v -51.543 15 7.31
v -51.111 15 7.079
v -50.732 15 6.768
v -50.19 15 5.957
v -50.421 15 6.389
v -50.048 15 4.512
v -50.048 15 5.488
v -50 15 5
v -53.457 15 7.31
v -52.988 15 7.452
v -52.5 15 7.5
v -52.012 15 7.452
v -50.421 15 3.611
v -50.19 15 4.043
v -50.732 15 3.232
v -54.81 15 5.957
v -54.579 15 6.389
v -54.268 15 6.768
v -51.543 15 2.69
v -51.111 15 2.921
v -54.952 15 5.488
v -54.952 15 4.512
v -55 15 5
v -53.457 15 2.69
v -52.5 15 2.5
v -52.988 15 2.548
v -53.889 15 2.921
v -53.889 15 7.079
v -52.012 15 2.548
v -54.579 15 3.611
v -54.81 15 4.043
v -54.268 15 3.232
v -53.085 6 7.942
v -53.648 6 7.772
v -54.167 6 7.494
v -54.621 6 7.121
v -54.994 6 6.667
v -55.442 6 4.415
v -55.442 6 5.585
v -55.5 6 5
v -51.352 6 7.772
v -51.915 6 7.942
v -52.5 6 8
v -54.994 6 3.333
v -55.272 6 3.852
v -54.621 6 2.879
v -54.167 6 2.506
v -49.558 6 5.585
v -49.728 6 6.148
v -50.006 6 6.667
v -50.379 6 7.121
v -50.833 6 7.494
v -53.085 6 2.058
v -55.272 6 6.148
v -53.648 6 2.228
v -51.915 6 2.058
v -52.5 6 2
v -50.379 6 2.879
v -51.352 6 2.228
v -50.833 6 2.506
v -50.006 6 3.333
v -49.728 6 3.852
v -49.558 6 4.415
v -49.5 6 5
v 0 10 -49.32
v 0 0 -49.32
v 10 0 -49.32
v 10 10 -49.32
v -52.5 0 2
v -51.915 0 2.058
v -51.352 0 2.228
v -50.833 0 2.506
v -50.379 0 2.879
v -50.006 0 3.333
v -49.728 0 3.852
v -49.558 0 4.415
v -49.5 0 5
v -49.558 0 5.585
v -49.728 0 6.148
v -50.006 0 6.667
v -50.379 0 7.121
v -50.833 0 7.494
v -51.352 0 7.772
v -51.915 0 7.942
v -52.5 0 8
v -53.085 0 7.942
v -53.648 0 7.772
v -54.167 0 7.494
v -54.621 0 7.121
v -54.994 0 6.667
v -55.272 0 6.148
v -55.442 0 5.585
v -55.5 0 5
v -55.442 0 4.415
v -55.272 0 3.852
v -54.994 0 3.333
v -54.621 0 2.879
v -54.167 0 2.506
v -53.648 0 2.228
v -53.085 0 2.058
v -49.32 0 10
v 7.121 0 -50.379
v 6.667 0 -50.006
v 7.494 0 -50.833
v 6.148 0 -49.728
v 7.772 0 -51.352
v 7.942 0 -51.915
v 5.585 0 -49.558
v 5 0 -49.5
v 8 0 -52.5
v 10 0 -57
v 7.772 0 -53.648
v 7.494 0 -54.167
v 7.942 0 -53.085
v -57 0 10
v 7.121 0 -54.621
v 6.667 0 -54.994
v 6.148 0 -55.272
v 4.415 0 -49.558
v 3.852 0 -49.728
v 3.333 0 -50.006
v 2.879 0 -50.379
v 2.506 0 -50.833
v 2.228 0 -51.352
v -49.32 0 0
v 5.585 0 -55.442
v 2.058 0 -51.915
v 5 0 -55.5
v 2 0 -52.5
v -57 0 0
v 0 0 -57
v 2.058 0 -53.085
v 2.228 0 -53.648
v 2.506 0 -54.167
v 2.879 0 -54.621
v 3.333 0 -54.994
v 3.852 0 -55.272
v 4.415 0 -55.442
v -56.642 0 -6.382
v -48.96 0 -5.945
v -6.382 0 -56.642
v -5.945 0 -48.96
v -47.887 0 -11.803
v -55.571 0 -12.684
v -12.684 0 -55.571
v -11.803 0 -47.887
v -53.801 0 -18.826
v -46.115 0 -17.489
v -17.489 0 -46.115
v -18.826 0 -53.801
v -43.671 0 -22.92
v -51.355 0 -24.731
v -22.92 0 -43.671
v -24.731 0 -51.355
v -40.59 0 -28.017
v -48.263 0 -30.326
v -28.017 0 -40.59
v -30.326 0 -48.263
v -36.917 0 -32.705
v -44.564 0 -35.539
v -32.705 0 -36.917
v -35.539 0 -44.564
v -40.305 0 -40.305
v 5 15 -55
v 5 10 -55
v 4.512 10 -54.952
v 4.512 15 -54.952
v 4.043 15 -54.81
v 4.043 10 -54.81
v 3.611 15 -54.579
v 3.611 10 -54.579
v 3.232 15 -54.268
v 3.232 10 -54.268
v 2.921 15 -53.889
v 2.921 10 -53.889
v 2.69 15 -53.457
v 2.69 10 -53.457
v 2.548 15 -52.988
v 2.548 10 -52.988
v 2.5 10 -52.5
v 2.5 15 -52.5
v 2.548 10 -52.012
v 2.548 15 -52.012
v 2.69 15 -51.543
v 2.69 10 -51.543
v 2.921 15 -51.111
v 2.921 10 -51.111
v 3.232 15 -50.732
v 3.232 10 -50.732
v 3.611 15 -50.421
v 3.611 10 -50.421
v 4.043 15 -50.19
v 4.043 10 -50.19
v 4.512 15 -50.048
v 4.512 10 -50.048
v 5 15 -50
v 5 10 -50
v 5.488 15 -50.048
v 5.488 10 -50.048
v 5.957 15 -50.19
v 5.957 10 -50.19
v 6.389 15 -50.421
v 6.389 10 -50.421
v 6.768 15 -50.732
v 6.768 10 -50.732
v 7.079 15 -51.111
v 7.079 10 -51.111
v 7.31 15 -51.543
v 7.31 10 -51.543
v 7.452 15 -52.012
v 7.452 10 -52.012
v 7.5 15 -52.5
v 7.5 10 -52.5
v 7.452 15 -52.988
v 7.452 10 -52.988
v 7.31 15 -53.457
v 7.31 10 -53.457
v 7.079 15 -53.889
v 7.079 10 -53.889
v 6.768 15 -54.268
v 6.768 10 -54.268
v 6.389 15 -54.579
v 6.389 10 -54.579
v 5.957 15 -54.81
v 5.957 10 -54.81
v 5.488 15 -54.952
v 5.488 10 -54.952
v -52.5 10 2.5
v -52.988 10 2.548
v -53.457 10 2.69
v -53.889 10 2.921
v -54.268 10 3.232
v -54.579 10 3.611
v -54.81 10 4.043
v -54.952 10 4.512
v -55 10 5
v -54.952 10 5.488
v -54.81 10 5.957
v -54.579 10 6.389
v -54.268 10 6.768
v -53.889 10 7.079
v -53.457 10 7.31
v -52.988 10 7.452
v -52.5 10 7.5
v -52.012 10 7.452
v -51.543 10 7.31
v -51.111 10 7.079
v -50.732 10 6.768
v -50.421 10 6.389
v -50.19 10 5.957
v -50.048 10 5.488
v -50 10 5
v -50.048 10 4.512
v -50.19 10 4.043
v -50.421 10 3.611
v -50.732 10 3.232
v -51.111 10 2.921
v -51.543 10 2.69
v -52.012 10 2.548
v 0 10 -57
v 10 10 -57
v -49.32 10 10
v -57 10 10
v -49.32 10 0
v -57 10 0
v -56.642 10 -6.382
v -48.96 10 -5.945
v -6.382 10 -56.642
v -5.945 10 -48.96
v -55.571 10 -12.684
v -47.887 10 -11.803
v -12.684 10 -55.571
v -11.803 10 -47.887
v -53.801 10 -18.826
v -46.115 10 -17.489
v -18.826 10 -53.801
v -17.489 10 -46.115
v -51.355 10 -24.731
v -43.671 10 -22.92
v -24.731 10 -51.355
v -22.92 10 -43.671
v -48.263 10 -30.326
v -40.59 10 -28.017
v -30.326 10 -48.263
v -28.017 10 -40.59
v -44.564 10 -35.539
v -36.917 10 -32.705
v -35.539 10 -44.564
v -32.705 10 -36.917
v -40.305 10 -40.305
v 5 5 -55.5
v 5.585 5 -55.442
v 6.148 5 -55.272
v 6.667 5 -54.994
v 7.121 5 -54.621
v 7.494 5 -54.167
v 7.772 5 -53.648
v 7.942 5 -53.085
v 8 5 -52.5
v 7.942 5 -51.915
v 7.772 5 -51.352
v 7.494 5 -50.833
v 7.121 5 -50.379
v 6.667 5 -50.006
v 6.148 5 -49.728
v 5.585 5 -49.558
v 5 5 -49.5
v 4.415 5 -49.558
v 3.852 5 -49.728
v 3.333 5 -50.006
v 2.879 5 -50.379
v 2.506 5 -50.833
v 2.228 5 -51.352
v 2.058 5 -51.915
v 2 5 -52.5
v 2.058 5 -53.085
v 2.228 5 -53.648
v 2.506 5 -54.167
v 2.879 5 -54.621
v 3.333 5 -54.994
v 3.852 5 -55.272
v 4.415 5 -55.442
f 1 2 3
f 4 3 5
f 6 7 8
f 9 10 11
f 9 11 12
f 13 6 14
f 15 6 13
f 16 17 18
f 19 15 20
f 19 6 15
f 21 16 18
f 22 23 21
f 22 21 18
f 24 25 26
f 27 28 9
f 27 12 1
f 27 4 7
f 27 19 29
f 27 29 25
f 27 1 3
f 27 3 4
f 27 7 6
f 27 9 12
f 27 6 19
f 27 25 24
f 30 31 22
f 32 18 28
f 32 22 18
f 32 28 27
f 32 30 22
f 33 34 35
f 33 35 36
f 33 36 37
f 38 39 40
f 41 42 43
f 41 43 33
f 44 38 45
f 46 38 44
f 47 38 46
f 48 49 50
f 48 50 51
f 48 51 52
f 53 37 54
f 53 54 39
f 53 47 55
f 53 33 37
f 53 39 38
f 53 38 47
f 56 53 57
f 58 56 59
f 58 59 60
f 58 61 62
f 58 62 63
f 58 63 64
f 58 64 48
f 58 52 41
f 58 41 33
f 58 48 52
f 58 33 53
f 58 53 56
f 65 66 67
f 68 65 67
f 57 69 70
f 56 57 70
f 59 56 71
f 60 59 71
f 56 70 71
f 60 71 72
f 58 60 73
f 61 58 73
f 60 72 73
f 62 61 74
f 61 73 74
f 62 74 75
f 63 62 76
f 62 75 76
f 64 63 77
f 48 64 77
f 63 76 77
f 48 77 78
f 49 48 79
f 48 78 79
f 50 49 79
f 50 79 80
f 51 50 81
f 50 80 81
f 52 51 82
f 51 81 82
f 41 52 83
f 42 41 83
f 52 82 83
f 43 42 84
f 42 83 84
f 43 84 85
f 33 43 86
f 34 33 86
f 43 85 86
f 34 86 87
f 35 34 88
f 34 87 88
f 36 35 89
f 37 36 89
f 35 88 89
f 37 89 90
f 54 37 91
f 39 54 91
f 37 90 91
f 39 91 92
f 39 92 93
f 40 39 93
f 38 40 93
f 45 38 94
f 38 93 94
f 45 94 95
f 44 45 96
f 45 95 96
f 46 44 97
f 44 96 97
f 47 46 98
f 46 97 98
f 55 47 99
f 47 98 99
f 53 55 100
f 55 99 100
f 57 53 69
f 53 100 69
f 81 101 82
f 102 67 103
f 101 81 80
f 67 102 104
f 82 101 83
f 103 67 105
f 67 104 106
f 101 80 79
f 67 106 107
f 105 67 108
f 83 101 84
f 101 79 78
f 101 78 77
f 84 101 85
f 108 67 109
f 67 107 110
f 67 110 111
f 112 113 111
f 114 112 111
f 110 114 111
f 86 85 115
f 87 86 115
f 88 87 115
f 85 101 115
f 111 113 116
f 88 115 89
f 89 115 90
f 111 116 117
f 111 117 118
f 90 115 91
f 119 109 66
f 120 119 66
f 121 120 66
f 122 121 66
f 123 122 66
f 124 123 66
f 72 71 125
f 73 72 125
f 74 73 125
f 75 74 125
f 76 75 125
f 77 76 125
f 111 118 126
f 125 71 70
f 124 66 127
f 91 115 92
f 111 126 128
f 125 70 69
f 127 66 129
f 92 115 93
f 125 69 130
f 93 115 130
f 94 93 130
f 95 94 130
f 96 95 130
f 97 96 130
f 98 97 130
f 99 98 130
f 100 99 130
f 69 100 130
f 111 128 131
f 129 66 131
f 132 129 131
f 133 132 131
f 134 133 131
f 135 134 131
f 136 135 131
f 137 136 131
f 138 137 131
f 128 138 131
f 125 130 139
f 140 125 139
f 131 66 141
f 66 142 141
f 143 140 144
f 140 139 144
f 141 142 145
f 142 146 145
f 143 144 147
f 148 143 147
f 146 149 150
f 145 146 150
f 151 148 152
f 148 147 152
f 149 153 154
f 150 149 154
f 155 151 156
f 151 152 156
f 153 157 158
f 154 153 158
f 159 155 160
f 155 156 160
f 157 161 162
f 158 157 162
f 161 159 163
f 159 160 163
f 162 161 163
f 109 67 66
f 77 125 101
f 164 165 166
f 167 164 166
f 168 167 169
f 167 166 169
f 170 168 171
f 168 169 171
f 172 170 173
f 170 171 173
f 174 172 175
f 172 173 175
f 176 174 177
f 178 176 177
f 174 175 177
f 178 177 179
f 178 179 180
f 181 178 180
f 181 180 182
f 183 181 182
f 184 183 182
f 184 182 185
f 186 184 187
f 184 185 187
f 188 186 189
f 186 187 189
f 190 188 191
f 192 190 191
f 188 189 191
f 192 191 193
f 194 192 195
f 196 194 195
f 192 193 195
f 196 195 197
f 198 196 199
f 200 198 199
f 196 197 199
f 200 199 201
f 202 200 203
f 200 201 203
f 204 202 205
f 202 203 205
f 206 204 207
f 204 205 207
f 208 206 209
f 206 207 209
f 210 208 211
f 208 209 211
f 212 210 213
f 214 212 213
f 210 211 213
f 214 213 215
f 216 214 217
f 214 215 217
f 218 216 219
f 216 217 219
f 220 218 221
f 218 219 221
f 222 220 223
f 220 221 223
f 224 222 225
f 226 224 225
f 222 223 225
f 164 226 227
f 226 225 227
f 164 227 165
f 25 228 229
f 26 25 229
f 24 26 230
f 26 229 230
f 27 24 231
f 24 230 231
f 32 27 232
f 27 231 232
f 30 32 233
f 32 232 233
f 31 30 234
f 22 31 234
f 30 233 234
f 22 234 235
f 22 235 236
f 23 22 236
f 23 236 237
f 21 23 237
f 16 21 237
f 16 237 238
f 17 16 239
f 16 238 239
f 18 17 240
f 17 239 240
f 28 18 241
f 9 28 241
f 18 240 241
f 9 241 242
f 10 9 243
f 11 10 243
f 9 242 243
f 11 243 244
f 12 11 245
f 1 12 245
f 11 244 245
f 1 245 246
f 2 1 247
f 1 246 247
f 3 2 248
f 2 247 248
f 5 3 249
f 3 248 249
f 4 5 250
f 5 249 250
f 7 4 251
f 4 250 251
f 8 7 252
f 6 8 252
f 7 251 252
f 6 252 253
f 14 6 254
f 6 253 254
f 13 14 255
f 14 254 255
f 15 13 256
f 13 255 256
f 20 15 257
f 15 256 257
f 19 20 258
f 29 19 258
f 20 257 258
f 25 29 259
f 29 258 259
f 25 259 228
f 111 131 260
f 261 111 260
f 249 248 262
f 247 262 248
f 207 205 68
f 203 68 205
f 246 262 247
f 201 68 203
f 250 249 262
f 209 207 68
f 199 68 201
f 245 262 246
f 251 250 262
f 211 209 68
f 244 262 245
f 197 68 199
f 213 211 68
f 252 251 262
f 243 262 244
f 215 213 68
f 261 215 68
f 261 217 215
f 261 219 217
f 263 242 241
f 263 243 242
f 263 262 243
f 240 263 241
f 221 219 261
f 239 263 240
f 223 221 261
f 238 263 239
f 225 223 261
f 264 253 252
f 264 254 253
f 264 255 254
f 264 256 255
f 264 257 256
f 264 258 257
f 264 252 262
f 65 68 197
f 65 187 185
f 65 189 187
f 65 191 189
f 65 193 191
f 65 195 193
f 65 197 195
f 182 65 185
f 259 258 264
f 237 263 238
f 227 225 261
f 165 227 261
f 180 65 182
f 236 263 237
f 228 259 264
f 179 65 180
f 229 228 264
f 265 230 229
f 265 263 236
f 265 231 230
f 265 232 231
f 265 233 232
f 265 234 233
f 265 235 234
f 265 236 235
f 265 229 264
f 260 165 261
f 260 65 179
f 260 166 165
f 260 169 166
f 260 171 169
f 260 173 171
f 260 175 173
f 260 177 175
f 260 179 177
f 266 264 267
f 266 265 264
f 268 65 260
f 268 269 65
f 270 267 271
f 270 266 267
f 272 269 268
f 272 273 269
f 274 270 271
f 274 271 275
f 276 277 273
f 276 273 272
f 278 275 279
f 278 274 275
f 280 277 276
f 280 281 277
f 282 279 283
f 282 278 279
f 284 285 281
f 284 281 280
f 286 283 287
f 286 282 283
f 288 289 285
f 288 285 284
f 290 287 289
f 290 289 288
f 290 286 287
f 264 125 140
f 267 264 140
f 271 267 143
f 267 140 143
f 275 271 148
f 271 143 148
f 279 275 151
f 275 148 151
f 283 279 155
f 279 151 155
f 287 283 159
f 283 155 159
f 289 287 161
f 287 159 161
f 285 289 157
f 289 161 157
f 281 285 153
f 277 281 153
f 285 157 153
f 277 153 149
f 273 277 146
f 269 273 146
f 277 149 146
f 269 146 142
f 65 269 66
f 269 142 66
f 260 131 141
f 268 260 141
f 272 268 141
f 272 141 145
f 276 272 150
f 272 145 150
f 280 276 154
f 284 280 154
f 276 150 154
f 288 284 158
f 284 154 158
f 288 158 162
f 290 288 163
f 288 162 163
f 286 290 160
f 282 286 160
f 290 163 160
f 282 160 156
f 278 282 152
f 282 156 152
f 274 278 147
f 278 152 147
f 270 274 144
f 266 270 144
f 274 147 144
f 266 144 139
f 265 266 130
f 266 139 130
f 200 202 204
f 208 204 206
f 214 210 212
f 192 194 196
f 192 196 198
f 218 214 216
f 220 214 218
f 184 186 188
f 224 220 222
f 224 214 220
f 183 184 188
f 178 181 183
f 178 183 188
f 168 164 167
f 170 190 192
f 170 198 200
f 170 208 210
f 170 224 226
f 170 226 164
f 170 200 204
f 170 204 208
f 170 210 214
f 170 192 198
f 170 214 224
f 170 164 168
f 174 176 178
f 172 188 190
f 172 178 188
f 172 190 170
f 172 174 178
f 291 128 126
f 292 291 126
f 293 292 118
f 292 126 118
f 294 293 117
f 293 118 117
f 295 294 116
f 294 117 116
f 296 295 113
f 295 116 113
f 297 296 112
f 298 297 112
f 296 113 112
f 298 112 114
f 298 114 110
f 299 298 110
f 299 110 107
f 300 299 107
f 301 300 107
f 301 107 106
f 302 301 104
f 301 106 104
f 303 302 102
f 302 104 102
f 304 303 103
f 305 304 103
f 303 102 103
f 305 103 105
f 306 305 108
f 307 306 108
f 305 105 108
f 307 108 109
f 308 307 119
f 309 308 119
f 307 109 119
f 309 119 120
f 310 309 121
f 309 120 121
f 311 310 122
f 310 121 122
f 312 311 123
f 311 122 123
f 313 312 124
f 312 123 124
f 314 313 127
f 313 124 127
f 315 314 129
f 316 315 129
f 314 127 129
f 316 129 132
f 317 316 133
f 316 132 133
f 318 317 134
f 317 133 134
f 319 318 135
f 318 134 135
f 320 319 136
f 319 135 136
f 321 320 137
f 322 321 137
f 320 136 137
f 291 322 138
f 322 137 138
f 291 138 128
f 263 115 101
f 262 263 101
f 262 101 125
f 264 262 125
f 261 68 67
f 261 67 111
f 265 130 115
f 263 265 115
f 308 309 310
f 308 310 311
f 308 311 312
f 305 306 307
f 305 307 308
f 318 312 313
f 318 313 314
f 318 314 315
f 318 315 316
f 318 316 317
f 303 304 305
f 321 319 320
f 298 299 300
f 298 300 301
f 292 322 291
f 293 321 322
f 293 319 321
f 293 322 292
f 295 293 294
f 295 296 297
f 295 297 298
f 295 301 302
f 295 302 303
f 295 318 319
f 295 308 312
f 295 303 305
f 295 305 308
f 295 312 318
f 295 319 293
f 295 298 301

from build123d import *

# Parameters (mm, degrees)
BOSS_EXTRUDE1_DEPTH    = 10
SKETCH2_R              = 3
CUT_EXTRUDE1_DEPTH     = 6
SKETCH3_R              = 2.5
BOSS_EXTRUDE2_DEPTH    = 5
SPLIT1_SURFACE_1_BACK  = 134.079
SPLIT1_SURFACE_1_DEPTH = 268.158
SKETCH5_W              = 9.5
SKETCH5_H              = 10
BOSS_EXTRUDE3_DEPTH    = 10
SKETCH6_R              = 2.5
BOSS_EXTRUDE4_DEPTH    = 5
SKETCH7_R              = 3
CUT_EXTRUDE2_DEPTH     = 5
SPLIT3_SURFACE_2_BACK  = 96.932
SPLIT3_SURFACE_2_DEPTH = 193.864


with BuildPart() as part:
    # Sketch1 → Boss-Extrude1 (new body)
    with BuildSketch(Plane(origin=(0, 0, 0), x_dir=(1, 0, 0), z_dir=(0, 1, 0))):
        with BuildLine():
            Line((-57, 0), (-57, -10))
            Line((-57, -10), (-47.5, -10))
            Line((-47.5, -10), (-47.5, 0))
            ThreePointArc((-47.5, 0), (0, 47.5), (47.5, 0))
            Line((47.5, 0), (47.5, -10))
            Line((47.5, -10), (57, -10))
            Line((57, -10), (57, 0))
            ThreePointArc((57, 0), (0, 57), (-57, 0))
        make_face()
    extrude(amount=BOSS_EXTRUDE1_DEPTH)

    # Sketch2 → Cut-Extrude1 (cut)
    with BuildSketch(Plane.XZ):
        with Locations(Location((-52.5, 5, 0), (0, 0, 270))):
            Circle(SKETCH2_R)
    cut_extrude1 = extrude(amount=-CUT_EXTRUDE1_DEPTH, mode=Mode.SUBTRACT)

    # Sketch3 → Boss-Extrude2 (add)
    with BuildSketch(Plane(origin=(0, 10, 0), x_dir=(1, 0, 0), z_dir=(0, 1, 0))):
        with Locations(Location((-52.5, -5, 0), (0, 0, 90))):
            Circle(SKETCH3_R)
    boss_extrude2 = extrude(amount=BOSS_EXTRUDE2_DEPTH)

    # Mirror1: Cut-Extrude1, Boss-Extrude2 across plane
    add(cut_extrude1.mirror(Plane.ZY), mode=Mode.SUBTRACT)
    add(boss_extrude2.mirror(Plane.ZY))

    # Split1: cut with a surface, the side it looks to stays
    # Split1 surface: a surface, the sketch's curves swept straight by 268.158 mm
    with BuildLine(Plane(origin=(0, 10, 0), x_dir=(1, 0, 0), z_dir=(0, 1, 0)).offset(-SPLIT1_SURFACE_1_BACK), mode=Mode.PRIVATE) as split1_surface_1_path:
        Line((0, 47.5), (0, 57))
    split1_surface_1 = Shell.extrude(split1_surface_1_path.wire(), (0 * SPLIT1_SURFACE_1_DEPTH, 1 * SPLIT1_SURFACE_1_DEPTH, 0 * SPLIT1_SURFACE_1_DEPTH))
    split(bisect_by=split1_surface_1, keep=Keep.TOP)

    # Sketch5 → Boss-Extrude3 (add)
    with BuildSketch(Plane(origin=(0, 0, 0), x_dir=(0, 0, -1), z_dir=(1, 0, 0))):
        with Locations((52.25, 5)):
            Rectangle(SKETCH5_W, SKETCH5_H)
    extrude(amount=BOSS_EXTRUDE3_DEPTH)

    # Sketch6 → Boss-Extrude4 (add)
    with BuildSketch(Plane(origin=(0, 10, 0), x_dir=(1, 0, 0), z_dir=(0, 1, 0))):
        with Locations(Location((5, 52.5, 0), (0, 0, 90))):
            Circle(SKETCH6_R)
    extrude(amount=BOSS_EXTRUDE4_DEPTH)

    # Sketch7 → Cut-Extrude2 (cut)
    with BuildSketch(Plane.XZ):
        with Locations(Location((5, -52.5, 0), (0, 0, 270))):
            Circle(SKETCH7_R)
    extrude(amount=-CUT_EXTRUDE2_DEPTH, mode=Mode.SUBTRACT)

    # Split3: cut with a surface, the side it looks to stays
    # Split3 surface: a surface, the sketch's curves swept straight by 193.864 mm
    with BuildLine(Plane(origin=(0, 10, 0), x_dir=(1, 0, 0), z_dir=(0, 1, 0)).offset(-SPLIT3_SURFACE_2_BACK), mode=Mode.PRIVATE) as split3_surface_2_path:
        Line((-49.32, -10), (-49.32, 0))
        ThreePointArc((-49.32, 0), (-34.874506448, 34.874506448), (0, 49.32))
        Line((0, 49.32), (10, 49.32))
    split3_surface_2 = Shell.extrude(split3_surface_2_path.wire(), (0 * SPLIT3_SURFACE_2_DEPTH, 1 * SPLIT3_SURFACE_2_DEPTH, 0 * SPLIT3_SURFACE_2_DEPTH))
    split(bisect_by=split3_surface_2, keep=Keep.TOP)


solid = part.part
